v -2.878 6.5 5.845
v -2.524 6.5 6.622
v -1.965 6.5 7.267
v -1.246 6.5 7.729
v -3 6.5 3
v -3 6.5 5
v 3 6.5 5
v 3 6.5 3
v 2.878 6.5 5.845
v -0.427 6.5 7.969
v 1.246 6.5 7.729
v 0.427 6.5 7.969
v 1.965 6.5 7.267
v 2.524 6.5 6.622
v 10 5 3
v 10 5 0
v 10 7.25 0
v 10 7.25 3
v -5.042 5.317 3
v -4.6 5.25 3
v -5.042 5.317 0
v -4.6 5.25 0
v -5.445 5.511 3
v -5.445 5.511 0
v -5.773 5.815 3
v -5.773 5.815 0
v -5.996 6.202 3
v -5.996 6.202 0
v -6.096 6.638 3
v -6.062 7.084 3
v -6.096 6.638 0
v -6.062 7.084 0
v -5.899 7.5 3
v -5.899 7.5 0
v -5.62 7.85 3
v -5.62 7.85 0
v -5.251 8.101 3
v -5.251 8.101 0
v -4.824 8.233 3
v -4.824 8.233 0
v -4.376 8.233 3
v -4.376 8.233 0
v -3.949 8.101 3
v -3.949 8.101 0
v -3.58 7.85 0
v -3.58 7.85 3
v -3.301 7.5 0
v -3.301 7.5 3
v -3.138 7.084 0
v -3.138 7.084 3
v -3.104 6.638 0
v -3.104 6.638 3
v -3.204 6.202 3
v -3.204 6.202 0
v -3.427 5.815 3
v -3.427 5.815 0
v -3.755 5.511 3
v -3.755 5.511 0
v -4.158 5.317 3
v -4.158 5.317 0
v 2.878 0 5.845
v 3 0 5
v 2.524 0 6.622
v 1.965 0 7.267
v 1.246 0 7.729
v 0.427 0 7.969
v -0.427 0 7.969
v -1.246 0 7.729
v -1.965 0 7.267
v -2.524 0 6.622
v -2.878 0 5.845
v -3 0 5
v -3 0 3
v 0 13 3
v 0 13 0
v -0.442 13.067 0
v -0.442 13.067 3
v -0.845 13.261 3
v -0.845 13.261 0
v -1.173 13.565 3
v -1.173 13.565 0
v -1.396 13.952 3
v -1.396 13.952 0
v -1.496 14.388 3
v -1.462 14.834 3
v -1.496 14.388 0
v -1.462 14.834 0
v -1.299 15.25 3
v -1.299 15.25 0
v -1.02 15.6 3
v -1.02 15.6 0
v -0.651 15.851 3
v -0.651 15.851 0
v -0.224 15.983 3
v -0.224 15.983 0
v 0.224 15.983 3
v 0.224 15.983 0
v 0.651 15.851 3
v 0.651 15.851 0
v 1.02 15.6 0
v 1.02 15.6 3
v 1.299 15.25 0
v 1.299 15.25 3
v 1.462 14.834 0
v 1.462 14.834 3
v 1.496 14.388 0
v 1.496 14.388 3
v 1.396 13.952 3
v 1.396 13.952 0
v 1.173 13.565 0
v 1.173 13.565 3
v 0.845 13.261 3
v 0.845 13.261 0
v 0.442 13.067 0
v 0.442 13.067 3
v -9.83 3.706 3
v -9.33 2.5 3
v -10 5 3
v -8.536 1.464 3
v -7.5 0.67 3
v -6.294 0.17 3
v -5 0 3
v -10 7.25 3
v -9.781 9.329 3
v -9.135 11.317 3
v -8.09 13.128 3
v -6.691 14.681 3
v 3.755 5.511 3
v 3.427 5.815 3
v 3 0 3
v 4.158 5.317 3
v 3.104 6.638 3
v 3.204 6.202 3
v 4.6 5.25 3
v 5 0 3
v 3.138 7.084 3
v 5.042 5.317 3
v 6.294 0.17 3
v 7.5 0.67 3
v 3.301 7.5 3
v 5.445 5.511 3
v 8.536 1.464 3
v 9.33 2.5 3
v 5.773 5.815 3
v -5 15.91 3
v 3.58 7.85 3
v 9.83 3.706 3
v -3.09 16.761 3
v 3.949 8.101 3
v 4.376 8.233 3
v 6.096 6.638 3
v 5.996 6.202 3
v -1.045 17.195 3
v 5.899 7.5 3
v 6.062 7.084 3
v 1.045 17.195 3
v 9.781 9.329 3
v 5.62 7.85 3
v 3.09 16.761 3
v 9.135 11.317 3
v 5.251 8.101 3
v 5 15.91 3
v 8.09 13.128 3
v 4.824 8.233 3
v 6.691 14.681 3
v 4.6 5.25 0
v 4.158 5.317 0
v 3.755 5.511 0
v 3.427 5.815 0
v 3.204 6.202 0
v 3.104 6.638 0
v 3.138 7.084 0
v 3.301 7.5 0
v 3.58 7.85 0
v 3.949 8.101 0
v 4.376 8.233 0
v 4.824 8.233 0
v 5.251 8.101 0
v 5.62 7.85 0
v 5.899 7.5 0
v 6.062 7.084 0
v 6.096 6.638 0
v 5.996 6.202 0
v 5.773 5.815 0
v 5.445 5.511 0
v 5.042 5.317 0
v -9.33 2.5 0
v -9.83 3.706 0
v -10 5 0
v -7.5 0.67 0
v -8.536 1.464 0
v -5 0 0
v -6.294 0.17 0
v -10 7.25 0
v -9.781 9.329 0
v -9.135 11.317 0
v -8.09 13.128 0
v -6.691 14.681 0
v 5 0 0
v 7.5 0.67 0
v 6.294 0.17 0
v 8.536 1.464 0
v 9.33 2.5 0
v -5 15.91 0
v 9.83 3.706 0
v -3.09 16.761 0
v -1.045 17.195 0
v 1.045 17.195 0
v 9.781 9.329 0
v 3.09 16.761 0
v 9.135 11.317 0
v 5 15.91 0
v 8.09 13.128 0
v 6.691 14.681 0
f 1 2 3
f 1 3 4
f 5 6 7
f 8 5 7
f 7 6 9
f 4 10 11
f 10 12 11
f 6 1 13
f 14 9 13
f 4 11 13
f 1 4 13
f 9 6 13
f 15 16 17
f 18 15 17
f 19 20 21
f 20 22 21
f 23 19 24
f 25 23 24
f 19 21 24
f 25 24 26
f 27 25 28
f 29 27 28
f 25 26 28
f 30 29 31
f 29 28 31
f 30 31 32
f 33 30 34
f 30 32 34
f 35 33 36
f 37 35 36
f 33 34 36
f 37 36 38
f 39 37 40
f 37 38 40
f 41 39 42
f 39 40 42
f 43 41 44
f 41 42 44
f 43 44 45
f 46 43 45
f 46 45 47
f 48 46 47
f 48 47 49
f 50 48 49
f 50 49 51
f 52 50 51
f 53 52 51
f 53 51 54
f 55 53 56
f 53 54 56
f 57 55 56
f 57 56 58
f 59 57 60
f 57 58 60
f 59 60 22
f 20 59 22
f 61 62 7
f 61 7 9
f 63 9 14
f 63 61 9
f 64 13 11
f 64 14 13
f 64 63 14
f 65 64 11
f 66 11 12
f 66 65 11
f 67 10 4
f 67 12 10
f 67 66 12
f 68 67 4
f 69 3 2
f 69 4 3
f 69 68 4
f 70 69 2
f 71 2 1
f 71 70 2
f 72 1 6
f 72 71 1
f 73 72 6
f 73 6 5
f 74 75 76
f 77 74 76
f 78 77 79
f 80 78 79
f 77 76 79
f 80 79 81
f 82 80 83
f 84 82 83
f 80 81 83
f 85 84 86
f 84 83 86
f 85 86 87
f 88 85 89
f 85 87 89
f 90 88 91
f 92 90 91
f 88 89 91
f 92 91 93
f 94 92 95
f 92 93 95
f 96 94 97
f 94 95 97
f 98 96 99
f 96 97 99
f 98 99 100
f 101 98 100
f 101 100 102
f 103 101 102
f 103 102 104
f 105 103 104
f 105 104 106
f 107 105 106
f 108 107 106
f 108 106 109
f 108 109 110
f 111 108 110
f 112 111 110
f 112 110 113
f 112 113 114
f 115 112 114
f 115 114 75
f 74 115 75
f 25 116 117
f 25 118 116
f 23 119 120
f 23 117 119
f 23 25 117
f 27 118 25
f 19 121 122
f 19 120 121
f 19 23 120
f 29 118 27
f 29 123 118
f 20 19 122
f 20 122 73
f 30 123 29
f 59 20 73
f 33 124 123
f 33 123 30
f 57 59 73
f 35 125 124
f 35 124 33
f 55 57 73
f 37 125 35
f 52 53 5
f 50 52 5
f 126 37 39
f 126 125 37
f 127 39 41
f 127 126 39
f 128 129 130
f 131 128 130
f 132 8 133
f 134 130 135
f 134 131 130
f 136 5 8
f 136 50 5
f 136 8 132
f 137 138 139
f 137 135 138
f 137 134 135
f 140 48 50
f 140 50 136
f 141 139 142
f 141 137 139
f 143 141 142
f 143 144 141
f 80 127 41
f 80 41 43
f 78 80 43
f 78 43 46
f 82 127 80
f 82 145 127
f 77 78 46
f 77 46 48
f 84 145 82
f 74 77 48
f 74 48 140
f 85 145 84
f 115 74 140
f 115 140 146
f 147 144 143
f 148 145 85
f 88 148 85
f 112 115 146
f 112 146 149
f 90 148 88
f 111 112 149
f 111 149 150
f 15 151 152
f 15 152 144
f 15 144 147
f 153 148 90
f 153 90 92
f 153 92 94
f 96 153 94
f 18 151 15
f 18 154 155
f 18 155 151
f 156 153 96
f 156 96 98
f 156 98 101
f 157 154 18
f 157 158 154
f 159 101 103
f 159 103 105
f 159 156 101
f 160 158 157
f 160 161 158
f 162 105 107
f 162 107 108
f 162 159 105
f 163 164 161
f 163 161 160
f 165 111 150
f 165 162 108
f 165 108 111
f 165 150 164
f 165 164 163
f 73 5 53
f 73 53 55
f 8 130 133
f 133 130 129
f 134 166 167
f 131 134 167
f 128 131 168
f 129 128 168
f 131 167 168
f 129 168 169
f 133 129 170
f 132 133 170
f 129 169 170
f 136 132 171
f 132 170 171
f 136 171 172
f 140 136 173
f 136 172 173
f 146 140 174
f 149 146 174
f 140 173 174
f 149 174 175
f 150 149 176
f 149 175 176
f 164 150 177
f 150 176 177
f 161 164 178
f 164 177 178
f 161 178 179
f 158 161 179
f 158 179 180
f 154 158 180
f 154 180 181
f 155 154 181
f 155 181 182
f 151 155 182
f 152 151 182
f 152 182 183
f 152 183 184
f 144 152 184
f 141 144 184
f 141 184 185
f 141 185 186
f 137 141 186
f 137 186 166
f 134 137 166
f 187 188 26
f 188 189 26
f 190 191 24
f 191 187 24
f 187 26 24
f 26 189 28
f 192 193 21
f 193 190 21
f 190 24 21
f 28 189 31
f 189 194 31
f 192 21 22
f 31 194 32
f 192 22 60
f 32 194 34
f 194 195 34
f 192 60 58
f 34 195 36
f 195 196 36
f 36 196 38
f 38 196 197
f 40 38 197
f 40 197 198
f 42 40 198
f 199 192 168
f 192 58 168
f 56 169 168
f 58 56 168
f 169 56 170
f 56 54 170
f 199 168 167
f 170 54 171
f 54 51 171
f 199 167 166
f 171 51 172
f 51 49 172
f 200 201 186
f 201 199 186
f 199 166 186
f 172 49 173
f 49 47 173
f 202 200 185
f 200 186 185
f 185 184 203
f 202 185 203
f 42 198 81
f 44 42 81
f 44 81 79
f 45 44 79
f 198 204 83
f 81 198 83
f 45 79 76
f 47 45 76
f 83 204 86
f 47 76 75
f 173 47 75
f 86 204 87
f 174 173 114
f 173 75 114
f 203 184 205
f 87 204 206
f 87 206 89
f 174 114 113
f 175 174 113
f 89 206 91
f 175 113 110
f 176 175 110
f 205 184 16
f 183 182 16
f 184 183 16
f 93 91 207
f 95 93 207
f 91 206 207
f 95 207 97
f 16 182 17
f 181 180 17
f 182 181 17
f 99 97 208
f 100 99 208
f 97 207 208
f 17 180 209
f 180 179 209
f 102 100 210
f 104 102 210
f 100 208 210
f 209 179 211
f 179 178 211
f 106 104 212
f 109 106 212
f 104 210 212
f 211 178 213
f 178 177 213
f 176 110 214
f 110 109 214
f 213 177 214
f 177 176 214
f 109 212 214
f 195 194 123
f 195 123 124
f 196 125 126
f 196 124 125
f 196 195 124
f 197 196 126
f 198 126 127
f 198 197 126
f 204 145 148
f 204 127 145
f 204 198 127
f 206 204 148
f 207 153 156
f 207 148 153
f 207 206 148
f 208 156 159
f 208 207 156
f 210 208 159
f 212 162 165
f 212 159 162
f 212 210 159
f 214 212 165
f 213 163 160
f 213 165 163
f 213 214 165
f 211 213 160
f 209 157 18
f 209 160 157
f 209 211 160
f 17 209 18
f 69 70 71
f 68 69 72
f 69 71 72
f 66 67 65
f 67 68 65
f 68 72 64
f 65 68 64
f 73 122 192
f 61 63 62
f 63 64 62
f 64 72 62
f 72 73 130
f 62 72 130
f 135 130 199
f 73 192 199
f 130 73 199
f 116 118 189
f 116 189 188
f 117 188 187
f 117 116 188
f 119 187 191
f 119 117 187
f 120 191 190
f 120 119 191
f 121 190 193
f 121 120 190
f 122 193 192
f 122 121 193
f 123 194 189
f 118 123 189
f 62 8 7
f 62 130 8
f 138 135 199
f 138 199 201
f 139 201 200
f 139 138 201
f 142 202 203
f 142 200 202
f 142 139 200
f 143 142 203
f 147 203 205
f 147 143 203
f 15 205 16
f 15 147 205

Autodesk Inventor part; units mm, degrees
ref_plane "YZ Plane" through (0, 0, 0) normal (1, 0, 0) x (0, 1, 0)
ref_plane "XZ Plane" through (0, 0, 0) normal (0, 1, 0) x (-1, 0, 0)
ref_plane "XY Plane" through (0, 0, 0) normal (0, 0, 1) x (1, 0, 0)
sketch "Esquisse1" plane through (0, 0, 0) normal (0, 0, 1) x (1, 0, 0)
  arc A0 (10, 7.25) -> (-10, 7.25) centre (0, 7.25) ccw
  line L0 (-10, 0) -> (10, 0)
  line L1 (10, 0) -> (10, 7.25)
  line L2 (-10, 7.25) -> (-10, 0)
  point P0 (0, 0)
  point P1 (0, 4.9938)
  point P2 (0, 0)
  dimension "d0" = 20
  dimension "d1" = 17.25
extrude "Extrusion1" add sketch "Esquisse1" along normal blind 3
fillet "Congé1" radius 5 2 edges at (-10, 0, 1.5) (10, 0, 1.5)
sketch "Esquisse2" plane through (-5, 0, 0) normal (0, -1, 0) x (1, 0, 0)
  line L0 (2, 3) -> (8, 3)
  line L1 (8, 3) -> (8, 5)
  line L2 (5, 8) -> (5, 8)
  line L3 (2, 5) -> (2, 3)
  line L4 (0, 0) -> (10, 0) projected
  line L5 (0, 3) -> (10, 3) projected
  arc A0 (5, 8) -> (2, 5) centre (5, 5) ccw
  arc A1 (8, 5) -> (5, 8) centre (5, 5) ccw
  point P0 (5, 0)
  point P1 (5, 3)
  point P2 (5, 0)
  dimension "d5" = 8
  dimension "d7" = 3
  dimension "d8" = 6
extrude "Extrusion2" add sketch "Esquisse2" against normal blind 6.5
sketch "Esquisse3" plane through (0, 0, 3) normal (0, 0, 1) x (1, 0, 0)
  line L0 (-3, 0) -> (3, 0) projected
  point P0 (0, 0)
  point P1 (-4.6, 6.75)
  point P2 (4.6, 6.75)
  point P3 (0, 14.5)
  point P4 (0, 0)
  dimension "d11" = 9.2
  dimension "d12" = 4.6
  dimension "d13" = 6.75
  dimension "d14" = 14.5
hole "Perçage1" at (-4.6, 6.75, 3) at (4.6, 6.75, 3) at (0, 14.5, 3) direction (0, 0, -1) diameter 3 depth 8 tip angle 118
equation "\"d7\" = 0.5 * d8"
equation "\"d12\" = 0.5 * d11"
properties part number "Support capteur" material "Plastique ABS"
